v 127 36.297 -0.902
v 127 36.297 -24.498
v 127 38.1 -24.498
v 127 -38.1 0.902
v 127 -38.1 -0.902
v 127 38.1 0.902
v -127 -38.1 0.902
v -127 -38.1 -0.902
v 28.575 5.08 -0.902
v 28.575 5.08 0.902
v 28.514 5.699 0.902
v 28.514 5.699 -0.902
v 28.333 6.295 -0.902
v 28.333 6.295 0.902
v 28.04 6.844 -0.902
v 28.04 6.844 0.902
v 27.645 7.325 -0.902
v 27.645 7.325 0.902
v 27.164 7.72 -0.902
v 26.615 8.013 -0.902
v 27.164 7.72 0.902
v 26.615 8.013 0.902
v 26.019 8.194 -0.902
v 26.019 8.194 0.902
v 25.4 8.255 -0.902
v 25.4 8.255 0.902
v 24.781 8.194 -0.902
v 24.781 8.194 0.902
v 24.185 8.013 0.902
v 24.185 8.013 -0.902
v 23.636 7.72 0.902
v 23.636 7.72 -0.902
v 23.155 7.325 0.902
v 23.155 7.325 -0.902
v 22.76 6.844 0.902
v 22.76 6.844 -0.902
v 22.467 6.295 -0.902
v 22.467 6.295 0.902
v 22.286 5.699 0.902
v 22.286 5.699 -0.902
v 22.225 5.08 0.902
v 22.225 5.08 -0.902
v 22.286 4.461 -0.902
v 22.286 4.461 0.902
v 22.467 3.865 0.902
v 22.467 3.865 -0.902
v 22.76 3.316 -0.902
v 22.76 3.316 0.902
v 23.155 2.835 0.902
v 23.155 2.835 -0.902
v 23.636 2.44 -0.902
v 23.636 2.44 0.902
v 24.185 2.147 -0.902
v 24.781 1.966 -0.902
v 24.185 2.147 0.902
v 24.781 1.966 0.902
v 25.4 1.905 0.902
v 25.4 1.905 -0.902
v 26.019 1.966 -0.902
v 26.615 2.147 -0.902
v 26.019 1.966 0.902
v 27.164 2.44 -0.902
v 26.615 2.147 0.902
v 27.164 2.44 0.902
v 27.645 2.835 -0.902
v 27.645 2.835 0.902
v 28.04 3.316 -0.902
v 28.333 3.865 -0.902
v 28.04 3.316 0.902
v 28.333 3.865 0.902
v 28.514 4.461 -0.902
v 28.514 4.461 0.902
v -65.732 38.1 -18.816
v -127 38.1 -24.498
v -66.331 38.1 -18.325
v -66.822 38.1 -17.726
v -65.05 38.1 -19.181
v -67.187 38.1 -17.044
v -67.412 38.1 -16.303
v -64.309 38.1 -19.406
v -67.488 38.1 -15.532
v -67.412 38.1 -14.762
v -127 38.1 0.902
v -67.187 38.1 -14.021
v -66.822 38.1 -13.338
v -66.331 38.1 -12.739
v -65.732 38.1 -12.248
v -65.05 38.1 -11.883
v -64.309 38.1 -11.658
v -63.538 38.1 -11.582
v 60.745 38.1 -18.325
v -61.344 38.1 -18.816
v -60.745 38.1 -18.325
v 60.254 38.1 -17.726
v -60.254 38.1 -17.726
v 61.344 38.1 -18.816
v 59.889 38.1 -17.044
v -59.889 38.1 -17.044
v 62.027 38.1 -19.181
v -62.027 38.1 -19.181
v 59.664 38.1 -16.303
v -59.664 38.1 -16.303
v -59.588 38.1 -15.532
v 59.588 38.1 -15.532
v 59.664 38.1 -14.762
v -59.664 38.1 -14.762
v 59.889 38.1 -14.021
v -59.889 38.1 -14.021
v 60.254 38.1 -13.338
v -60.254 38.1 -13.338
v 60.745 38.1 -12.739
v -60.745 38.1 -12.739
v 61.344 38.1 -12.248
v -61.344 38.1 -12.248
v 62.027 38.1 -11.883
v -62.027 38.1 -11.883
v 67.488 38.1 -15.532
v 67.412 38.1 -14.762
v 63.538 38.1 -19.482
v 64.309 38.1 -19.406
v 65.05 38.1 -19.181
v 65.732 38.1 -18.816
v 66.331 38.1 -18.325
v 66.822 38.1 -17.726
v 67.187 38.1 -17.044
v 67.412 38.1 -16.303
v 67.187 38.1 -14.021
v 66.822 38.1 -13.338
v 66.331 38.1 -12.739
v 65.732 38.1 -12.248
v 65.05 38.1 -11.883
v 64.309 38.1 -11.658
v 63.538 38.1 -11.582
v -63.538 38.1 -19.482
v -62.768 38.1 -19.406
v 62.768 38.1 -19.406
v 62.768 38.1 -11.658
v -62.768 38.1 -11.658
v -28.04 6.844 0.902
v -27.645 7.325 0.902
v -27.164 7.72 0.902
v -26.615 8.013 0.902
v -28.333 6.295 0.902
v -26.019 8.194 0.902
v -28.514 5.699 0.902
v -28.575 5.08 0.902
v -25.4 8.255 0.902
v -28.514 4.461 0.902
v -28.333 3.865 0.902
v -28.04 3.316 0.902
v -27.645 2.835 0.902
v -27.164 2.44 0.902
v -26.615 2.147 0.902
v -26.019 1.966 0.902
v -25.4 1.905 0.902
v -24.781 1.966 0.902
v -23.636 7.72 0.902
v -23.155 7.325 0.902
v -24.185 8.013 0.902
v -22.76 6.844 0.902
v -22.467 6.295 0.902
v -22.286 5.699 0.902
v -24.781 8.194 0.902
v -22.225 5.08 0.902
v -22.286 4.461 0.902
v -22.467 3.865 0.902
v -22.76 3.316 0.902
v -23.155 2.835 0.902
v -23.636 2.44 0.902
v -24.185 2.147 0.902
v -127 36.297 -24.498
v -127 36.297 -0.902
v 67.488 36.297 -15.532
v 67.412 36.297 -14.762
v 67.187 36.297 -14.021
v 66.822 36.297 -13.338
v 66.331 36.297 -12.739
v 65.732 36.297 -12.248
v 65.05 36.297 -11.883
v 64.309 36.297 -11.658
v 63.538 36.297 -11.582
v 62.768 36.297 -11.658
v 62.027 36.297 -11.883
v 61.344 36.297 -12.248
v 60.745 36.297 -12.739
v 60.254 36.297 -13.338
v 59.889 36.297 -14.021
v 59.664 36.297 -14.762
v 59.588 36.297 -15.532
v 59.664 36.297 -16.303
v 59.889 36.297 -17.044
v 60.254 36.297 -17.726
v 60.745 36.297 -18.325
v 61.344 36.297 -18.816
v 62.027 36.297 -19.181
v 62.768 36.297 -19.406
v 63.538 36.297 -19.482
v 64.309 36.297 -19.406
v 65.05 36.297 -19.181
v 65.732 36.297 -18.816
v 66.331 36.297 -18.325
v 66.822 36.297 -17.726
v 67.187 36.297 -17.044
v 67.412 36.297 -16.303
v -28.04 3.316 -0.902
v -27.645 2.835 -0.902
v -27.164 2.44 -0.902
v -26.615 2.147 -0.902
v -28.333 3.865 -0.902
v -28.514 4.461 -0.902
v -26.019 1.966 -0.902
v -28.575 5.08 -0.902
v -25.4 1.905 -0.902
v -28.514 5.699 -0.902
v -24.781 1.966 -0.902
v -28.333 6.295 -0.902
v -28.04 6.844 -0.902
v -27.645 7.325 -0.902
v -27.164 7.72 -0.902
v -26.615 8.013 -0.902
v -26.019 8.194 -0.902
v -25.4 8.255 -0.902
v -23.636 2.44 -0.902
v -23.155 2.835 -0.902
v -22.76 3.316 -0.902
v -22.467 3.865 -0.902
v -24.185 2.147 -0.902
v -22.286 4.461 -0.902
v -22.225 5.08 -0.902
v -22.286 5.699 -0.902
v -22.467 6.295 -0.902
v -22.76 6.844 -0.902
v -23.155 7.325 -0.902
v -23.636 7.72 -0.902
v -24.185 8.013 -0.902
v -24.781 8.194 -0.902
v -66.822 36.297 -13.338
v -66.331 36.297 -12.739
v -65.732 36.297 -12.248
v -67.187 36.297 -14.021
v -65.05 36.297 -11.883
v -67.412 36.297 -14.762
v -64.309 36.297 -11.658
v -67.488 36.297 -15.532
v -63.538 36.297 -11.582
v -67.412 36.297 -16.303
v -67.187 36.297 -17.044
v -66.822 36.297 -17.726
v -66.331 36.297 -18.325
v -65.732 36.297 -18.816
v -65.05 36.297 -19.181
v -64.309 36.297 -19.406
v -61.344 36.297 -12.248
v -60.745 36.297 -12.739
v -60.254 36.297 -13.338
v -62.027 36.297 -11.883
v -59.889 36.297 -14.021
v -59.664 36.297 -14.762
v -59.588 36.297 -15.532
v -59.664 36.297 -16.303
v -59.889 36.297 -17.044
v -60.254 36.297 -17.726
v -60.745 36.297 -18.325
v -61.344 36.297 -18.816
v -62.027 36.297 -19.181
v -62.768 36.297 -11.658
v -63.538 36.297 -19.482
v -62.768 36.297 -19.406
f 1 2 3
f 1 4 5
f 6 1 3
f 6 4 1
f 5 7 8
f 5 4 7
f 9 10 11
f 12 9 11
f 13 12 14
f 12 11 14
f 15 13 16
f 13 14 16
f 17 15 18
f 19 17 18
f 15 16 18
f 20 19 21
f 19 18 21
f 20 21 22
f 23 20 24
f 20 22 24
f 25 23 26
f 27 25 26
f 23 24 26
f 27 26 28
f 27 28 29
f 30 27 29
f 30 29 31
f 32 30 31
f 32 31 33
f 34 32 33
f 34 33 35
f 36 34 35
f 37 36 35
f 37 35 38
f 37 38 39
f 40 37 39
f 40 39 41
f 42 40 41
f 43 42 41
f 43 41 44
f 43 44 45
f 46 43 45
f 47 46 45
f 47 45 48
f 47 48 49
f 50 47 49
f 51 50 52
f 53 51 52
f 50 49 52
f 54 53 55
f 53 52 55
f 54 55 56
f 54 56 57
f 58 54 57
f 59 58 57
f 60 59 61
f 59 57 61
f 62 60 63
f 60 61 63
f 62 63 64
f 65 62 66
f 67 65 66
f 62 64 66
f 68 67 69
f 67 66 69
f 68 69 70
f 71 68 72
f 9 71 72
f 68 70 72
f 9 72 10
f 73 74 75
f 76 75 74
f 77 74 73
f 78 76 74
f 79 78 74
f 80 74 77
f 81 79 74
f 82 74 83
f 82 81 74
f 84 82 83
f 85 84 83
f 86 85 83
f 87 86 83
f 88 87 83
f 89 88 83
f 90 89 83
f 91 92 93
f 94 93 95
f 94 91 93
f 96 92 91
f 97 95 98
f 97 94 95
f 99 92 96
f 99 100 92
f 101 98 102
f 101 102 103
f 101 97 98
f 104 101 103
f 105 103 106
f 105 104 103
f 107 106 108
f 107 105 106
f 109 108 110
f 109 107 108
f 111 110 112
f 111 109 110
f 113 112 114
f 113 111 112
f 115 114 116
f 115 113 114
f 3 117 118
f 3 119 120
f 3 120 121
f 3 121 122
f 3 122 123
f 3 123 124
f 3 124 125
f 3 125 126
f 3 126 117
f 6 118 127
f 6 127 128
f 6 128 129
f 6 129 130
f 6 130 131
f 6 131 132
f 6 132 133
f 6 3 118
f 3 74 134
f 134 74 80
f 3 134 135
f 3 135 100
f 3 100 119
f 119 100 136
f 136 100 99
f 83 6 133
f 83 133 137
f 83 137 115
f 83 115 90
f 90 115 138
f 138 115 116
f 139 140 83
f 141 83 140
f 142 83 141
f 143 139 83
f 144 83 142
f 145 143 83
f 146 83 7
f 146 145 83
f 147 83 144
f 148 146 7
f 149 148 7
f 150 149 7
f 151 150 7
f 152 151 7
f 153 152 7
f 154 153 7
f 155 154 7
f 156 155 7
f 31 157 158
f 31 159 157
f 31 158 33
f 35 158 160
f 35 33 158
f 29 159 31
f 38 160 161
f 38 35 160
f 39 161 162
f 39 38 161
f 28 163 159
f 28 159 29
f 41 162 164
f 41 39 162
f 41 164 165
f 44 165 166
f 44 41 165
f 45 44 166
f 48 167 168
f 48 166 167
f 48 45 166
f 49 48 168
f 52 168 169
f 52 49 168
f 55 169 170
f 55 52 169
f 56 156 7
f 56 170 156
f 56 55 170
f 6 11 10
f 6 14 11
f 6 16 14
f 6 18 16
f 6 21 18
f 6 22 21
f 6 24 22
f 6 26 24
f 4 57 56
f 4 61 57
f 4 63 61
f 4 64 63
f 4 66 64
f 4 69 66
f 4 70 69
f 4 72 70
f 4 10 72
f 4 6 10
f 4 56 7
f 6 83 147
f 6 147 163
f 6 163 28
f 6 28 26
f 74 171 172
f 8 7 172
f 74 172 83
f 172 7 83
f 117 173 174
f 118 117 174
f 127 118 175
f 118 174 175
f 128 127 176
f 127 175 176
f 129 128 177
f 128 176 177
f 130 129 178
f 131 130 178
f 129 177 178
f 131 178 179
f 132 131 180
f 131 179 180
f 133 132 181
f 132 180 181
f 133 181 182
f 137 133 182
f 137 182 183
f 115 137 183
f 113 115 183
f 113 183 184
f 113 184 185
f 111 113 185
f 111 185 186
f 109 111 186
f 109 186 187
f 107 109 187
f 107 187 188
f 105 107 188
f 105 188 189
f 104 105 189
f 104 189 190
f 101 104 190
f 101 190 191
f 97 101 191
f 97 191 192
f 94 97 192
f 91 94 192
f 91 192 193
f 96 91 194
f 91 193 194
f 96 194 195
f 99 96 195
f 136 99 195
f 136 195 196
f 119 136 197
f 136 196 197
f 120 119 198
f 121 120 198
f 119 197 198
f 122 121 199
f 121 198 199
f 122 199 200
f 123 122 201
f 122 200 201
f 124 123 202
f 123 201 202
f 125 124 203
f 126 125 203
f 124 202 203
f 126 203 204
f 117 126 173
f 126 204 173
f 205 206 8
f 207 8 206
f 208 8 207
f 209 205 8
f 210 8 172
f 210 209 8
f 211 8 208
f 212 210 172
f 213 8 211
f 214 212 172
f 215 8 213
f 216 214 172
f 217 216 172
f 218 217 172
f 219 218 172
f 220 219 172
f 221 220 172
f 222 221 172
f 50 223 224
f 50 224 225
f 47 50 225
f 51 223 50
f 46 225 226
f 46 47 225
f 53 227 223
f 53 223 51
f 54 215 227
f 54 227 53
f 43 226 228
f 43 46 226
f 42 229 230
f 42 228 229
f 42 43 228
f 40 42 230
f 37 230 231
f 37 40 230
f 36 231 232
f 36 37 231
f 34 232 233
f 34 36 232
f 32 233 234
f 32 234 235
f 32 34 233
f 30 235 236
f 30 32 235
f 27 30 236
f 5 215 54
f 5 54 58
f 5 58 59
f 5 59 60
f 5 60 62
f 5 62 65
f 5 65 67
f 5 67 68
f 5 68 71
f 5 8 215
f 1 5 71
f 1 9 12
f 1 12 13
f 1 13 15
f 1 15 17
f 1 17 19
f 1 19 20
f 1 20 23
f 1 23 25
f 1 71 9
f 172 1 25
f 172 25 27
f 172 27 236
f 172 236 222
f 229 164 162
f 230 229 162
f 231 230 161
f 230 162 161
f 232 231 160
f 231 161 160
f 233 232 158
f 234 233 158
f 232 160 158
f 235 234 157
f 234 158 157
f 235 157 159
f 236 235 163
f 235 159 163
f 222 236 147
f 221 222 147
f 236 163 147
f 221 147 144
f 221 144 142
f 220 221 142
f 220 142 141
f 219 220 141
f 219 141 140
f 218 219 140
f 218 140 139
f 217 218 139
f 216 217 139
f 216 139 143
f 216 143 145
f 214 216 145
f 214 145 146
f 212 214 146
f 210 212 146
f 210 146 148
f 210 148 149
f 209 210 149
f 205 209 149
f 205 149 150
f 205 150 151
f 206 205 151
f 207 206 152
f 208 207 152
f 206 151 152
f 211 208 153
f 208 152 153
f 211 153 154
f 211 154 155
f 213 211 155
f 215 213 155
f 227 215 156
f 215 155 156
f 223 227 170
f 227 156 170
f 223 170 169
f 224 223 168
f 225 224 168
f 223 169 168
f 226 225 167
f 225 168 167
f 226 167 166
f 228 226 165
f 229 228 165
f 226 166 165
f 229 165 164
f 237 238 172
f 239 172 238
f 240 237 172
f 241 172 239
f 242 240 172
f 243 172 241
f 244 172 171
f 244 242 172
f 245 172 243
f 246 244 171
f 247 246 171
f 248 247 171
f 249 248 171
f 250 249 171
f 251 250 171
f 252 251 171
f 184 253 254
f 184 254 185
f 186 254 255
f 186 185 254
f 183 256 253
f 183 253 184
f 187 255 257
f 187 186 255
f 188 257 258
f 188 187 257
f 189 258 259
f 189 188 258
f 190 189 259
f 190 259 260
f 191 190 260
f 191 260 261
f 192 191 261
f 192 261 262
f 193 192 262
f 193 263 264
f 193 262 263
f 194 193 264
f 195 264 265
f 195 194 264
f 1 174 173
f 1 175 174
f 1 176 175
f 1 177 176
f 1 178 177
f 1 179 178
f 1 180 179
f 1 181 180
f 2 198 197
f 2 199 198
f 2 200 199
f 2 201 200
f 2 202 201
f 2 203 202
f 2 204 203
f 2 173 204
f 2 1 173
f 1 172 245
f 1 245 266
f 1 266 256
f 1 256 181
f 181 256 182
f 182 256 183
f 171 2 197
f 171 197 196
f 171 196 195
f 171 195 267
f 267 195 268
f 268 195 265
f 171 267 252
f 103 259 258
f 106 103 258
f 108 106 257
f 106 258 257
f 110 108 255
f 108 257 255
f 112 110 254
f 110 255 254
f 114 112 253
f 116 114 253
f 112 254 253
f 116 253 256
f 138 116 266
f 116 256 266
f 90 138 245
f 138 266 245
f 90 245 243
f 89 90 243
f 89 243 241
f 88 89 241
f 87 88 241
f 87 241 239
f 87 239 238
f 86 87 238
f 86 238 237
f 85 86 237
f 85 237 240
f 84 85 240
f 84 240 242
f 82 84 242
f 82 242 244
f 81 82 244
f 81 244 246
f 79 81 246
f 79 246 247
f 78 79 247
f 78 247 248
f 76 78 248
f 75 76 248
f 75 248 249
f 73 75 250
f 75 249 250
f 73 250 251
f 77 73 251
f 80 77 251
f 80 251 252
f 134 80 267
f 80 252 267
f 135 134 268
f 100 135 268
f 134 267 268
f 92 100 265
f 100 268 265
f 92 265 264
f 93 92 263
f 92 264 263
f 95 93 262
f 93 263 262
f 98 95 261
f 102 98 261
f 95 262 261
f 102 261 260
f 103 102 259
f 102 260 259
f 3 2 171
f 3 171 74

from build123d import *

# Parameters (mm, degrees)
F1_DEPTH      = 127
F1_DEPTH_BACK = 127
F2_R          = 3.175
F3_DEPTH      = 25.401
F5_D          = 7.8994
F5_DEPTH      = 12.7


with BuildPart() as f1:
    # F0 (on Right) → F1 (new body, two sides)
    with BuildSketch(Plane.YZ) as f1_sk:
        Polygon((-38.1, -0.9017), (36.2966, -0.9017), (36.2966, -24.4983), (38.1, -24.4983), (38.1, -0.9017), (38.1, 0.9017), (-38.1, 0.9017), align=None)
    extrude(amount=F1_DEPTH)
    extrude(f1_sk.sketch, amount=-F1_DEPTH_BACK)

    # F2 (on face) → F3 (cut, through all)
    with BuildSketch(Plane.XY.offset(0.9017)):
        with Locations((-25.4, 5.08)):
            Circle(F2_R)
        with Locations((25.4, 5.08)):
            Circle(F2_R)
    extrude(amount=-F3_DEPTH, mode=Mode.SUBTRACT)

    # F5
    with Locations(Plane(origin=(0, 38.1, 0), x_dir=(-1, 0, 0), z_dir=(0, 1, 0))):
        with Locations((-63.5381, -15.5321), (63.5381, -15.5321)):
            Hole(F5_D / 2, depth=F5_DEPTH)


solid = f1.part
